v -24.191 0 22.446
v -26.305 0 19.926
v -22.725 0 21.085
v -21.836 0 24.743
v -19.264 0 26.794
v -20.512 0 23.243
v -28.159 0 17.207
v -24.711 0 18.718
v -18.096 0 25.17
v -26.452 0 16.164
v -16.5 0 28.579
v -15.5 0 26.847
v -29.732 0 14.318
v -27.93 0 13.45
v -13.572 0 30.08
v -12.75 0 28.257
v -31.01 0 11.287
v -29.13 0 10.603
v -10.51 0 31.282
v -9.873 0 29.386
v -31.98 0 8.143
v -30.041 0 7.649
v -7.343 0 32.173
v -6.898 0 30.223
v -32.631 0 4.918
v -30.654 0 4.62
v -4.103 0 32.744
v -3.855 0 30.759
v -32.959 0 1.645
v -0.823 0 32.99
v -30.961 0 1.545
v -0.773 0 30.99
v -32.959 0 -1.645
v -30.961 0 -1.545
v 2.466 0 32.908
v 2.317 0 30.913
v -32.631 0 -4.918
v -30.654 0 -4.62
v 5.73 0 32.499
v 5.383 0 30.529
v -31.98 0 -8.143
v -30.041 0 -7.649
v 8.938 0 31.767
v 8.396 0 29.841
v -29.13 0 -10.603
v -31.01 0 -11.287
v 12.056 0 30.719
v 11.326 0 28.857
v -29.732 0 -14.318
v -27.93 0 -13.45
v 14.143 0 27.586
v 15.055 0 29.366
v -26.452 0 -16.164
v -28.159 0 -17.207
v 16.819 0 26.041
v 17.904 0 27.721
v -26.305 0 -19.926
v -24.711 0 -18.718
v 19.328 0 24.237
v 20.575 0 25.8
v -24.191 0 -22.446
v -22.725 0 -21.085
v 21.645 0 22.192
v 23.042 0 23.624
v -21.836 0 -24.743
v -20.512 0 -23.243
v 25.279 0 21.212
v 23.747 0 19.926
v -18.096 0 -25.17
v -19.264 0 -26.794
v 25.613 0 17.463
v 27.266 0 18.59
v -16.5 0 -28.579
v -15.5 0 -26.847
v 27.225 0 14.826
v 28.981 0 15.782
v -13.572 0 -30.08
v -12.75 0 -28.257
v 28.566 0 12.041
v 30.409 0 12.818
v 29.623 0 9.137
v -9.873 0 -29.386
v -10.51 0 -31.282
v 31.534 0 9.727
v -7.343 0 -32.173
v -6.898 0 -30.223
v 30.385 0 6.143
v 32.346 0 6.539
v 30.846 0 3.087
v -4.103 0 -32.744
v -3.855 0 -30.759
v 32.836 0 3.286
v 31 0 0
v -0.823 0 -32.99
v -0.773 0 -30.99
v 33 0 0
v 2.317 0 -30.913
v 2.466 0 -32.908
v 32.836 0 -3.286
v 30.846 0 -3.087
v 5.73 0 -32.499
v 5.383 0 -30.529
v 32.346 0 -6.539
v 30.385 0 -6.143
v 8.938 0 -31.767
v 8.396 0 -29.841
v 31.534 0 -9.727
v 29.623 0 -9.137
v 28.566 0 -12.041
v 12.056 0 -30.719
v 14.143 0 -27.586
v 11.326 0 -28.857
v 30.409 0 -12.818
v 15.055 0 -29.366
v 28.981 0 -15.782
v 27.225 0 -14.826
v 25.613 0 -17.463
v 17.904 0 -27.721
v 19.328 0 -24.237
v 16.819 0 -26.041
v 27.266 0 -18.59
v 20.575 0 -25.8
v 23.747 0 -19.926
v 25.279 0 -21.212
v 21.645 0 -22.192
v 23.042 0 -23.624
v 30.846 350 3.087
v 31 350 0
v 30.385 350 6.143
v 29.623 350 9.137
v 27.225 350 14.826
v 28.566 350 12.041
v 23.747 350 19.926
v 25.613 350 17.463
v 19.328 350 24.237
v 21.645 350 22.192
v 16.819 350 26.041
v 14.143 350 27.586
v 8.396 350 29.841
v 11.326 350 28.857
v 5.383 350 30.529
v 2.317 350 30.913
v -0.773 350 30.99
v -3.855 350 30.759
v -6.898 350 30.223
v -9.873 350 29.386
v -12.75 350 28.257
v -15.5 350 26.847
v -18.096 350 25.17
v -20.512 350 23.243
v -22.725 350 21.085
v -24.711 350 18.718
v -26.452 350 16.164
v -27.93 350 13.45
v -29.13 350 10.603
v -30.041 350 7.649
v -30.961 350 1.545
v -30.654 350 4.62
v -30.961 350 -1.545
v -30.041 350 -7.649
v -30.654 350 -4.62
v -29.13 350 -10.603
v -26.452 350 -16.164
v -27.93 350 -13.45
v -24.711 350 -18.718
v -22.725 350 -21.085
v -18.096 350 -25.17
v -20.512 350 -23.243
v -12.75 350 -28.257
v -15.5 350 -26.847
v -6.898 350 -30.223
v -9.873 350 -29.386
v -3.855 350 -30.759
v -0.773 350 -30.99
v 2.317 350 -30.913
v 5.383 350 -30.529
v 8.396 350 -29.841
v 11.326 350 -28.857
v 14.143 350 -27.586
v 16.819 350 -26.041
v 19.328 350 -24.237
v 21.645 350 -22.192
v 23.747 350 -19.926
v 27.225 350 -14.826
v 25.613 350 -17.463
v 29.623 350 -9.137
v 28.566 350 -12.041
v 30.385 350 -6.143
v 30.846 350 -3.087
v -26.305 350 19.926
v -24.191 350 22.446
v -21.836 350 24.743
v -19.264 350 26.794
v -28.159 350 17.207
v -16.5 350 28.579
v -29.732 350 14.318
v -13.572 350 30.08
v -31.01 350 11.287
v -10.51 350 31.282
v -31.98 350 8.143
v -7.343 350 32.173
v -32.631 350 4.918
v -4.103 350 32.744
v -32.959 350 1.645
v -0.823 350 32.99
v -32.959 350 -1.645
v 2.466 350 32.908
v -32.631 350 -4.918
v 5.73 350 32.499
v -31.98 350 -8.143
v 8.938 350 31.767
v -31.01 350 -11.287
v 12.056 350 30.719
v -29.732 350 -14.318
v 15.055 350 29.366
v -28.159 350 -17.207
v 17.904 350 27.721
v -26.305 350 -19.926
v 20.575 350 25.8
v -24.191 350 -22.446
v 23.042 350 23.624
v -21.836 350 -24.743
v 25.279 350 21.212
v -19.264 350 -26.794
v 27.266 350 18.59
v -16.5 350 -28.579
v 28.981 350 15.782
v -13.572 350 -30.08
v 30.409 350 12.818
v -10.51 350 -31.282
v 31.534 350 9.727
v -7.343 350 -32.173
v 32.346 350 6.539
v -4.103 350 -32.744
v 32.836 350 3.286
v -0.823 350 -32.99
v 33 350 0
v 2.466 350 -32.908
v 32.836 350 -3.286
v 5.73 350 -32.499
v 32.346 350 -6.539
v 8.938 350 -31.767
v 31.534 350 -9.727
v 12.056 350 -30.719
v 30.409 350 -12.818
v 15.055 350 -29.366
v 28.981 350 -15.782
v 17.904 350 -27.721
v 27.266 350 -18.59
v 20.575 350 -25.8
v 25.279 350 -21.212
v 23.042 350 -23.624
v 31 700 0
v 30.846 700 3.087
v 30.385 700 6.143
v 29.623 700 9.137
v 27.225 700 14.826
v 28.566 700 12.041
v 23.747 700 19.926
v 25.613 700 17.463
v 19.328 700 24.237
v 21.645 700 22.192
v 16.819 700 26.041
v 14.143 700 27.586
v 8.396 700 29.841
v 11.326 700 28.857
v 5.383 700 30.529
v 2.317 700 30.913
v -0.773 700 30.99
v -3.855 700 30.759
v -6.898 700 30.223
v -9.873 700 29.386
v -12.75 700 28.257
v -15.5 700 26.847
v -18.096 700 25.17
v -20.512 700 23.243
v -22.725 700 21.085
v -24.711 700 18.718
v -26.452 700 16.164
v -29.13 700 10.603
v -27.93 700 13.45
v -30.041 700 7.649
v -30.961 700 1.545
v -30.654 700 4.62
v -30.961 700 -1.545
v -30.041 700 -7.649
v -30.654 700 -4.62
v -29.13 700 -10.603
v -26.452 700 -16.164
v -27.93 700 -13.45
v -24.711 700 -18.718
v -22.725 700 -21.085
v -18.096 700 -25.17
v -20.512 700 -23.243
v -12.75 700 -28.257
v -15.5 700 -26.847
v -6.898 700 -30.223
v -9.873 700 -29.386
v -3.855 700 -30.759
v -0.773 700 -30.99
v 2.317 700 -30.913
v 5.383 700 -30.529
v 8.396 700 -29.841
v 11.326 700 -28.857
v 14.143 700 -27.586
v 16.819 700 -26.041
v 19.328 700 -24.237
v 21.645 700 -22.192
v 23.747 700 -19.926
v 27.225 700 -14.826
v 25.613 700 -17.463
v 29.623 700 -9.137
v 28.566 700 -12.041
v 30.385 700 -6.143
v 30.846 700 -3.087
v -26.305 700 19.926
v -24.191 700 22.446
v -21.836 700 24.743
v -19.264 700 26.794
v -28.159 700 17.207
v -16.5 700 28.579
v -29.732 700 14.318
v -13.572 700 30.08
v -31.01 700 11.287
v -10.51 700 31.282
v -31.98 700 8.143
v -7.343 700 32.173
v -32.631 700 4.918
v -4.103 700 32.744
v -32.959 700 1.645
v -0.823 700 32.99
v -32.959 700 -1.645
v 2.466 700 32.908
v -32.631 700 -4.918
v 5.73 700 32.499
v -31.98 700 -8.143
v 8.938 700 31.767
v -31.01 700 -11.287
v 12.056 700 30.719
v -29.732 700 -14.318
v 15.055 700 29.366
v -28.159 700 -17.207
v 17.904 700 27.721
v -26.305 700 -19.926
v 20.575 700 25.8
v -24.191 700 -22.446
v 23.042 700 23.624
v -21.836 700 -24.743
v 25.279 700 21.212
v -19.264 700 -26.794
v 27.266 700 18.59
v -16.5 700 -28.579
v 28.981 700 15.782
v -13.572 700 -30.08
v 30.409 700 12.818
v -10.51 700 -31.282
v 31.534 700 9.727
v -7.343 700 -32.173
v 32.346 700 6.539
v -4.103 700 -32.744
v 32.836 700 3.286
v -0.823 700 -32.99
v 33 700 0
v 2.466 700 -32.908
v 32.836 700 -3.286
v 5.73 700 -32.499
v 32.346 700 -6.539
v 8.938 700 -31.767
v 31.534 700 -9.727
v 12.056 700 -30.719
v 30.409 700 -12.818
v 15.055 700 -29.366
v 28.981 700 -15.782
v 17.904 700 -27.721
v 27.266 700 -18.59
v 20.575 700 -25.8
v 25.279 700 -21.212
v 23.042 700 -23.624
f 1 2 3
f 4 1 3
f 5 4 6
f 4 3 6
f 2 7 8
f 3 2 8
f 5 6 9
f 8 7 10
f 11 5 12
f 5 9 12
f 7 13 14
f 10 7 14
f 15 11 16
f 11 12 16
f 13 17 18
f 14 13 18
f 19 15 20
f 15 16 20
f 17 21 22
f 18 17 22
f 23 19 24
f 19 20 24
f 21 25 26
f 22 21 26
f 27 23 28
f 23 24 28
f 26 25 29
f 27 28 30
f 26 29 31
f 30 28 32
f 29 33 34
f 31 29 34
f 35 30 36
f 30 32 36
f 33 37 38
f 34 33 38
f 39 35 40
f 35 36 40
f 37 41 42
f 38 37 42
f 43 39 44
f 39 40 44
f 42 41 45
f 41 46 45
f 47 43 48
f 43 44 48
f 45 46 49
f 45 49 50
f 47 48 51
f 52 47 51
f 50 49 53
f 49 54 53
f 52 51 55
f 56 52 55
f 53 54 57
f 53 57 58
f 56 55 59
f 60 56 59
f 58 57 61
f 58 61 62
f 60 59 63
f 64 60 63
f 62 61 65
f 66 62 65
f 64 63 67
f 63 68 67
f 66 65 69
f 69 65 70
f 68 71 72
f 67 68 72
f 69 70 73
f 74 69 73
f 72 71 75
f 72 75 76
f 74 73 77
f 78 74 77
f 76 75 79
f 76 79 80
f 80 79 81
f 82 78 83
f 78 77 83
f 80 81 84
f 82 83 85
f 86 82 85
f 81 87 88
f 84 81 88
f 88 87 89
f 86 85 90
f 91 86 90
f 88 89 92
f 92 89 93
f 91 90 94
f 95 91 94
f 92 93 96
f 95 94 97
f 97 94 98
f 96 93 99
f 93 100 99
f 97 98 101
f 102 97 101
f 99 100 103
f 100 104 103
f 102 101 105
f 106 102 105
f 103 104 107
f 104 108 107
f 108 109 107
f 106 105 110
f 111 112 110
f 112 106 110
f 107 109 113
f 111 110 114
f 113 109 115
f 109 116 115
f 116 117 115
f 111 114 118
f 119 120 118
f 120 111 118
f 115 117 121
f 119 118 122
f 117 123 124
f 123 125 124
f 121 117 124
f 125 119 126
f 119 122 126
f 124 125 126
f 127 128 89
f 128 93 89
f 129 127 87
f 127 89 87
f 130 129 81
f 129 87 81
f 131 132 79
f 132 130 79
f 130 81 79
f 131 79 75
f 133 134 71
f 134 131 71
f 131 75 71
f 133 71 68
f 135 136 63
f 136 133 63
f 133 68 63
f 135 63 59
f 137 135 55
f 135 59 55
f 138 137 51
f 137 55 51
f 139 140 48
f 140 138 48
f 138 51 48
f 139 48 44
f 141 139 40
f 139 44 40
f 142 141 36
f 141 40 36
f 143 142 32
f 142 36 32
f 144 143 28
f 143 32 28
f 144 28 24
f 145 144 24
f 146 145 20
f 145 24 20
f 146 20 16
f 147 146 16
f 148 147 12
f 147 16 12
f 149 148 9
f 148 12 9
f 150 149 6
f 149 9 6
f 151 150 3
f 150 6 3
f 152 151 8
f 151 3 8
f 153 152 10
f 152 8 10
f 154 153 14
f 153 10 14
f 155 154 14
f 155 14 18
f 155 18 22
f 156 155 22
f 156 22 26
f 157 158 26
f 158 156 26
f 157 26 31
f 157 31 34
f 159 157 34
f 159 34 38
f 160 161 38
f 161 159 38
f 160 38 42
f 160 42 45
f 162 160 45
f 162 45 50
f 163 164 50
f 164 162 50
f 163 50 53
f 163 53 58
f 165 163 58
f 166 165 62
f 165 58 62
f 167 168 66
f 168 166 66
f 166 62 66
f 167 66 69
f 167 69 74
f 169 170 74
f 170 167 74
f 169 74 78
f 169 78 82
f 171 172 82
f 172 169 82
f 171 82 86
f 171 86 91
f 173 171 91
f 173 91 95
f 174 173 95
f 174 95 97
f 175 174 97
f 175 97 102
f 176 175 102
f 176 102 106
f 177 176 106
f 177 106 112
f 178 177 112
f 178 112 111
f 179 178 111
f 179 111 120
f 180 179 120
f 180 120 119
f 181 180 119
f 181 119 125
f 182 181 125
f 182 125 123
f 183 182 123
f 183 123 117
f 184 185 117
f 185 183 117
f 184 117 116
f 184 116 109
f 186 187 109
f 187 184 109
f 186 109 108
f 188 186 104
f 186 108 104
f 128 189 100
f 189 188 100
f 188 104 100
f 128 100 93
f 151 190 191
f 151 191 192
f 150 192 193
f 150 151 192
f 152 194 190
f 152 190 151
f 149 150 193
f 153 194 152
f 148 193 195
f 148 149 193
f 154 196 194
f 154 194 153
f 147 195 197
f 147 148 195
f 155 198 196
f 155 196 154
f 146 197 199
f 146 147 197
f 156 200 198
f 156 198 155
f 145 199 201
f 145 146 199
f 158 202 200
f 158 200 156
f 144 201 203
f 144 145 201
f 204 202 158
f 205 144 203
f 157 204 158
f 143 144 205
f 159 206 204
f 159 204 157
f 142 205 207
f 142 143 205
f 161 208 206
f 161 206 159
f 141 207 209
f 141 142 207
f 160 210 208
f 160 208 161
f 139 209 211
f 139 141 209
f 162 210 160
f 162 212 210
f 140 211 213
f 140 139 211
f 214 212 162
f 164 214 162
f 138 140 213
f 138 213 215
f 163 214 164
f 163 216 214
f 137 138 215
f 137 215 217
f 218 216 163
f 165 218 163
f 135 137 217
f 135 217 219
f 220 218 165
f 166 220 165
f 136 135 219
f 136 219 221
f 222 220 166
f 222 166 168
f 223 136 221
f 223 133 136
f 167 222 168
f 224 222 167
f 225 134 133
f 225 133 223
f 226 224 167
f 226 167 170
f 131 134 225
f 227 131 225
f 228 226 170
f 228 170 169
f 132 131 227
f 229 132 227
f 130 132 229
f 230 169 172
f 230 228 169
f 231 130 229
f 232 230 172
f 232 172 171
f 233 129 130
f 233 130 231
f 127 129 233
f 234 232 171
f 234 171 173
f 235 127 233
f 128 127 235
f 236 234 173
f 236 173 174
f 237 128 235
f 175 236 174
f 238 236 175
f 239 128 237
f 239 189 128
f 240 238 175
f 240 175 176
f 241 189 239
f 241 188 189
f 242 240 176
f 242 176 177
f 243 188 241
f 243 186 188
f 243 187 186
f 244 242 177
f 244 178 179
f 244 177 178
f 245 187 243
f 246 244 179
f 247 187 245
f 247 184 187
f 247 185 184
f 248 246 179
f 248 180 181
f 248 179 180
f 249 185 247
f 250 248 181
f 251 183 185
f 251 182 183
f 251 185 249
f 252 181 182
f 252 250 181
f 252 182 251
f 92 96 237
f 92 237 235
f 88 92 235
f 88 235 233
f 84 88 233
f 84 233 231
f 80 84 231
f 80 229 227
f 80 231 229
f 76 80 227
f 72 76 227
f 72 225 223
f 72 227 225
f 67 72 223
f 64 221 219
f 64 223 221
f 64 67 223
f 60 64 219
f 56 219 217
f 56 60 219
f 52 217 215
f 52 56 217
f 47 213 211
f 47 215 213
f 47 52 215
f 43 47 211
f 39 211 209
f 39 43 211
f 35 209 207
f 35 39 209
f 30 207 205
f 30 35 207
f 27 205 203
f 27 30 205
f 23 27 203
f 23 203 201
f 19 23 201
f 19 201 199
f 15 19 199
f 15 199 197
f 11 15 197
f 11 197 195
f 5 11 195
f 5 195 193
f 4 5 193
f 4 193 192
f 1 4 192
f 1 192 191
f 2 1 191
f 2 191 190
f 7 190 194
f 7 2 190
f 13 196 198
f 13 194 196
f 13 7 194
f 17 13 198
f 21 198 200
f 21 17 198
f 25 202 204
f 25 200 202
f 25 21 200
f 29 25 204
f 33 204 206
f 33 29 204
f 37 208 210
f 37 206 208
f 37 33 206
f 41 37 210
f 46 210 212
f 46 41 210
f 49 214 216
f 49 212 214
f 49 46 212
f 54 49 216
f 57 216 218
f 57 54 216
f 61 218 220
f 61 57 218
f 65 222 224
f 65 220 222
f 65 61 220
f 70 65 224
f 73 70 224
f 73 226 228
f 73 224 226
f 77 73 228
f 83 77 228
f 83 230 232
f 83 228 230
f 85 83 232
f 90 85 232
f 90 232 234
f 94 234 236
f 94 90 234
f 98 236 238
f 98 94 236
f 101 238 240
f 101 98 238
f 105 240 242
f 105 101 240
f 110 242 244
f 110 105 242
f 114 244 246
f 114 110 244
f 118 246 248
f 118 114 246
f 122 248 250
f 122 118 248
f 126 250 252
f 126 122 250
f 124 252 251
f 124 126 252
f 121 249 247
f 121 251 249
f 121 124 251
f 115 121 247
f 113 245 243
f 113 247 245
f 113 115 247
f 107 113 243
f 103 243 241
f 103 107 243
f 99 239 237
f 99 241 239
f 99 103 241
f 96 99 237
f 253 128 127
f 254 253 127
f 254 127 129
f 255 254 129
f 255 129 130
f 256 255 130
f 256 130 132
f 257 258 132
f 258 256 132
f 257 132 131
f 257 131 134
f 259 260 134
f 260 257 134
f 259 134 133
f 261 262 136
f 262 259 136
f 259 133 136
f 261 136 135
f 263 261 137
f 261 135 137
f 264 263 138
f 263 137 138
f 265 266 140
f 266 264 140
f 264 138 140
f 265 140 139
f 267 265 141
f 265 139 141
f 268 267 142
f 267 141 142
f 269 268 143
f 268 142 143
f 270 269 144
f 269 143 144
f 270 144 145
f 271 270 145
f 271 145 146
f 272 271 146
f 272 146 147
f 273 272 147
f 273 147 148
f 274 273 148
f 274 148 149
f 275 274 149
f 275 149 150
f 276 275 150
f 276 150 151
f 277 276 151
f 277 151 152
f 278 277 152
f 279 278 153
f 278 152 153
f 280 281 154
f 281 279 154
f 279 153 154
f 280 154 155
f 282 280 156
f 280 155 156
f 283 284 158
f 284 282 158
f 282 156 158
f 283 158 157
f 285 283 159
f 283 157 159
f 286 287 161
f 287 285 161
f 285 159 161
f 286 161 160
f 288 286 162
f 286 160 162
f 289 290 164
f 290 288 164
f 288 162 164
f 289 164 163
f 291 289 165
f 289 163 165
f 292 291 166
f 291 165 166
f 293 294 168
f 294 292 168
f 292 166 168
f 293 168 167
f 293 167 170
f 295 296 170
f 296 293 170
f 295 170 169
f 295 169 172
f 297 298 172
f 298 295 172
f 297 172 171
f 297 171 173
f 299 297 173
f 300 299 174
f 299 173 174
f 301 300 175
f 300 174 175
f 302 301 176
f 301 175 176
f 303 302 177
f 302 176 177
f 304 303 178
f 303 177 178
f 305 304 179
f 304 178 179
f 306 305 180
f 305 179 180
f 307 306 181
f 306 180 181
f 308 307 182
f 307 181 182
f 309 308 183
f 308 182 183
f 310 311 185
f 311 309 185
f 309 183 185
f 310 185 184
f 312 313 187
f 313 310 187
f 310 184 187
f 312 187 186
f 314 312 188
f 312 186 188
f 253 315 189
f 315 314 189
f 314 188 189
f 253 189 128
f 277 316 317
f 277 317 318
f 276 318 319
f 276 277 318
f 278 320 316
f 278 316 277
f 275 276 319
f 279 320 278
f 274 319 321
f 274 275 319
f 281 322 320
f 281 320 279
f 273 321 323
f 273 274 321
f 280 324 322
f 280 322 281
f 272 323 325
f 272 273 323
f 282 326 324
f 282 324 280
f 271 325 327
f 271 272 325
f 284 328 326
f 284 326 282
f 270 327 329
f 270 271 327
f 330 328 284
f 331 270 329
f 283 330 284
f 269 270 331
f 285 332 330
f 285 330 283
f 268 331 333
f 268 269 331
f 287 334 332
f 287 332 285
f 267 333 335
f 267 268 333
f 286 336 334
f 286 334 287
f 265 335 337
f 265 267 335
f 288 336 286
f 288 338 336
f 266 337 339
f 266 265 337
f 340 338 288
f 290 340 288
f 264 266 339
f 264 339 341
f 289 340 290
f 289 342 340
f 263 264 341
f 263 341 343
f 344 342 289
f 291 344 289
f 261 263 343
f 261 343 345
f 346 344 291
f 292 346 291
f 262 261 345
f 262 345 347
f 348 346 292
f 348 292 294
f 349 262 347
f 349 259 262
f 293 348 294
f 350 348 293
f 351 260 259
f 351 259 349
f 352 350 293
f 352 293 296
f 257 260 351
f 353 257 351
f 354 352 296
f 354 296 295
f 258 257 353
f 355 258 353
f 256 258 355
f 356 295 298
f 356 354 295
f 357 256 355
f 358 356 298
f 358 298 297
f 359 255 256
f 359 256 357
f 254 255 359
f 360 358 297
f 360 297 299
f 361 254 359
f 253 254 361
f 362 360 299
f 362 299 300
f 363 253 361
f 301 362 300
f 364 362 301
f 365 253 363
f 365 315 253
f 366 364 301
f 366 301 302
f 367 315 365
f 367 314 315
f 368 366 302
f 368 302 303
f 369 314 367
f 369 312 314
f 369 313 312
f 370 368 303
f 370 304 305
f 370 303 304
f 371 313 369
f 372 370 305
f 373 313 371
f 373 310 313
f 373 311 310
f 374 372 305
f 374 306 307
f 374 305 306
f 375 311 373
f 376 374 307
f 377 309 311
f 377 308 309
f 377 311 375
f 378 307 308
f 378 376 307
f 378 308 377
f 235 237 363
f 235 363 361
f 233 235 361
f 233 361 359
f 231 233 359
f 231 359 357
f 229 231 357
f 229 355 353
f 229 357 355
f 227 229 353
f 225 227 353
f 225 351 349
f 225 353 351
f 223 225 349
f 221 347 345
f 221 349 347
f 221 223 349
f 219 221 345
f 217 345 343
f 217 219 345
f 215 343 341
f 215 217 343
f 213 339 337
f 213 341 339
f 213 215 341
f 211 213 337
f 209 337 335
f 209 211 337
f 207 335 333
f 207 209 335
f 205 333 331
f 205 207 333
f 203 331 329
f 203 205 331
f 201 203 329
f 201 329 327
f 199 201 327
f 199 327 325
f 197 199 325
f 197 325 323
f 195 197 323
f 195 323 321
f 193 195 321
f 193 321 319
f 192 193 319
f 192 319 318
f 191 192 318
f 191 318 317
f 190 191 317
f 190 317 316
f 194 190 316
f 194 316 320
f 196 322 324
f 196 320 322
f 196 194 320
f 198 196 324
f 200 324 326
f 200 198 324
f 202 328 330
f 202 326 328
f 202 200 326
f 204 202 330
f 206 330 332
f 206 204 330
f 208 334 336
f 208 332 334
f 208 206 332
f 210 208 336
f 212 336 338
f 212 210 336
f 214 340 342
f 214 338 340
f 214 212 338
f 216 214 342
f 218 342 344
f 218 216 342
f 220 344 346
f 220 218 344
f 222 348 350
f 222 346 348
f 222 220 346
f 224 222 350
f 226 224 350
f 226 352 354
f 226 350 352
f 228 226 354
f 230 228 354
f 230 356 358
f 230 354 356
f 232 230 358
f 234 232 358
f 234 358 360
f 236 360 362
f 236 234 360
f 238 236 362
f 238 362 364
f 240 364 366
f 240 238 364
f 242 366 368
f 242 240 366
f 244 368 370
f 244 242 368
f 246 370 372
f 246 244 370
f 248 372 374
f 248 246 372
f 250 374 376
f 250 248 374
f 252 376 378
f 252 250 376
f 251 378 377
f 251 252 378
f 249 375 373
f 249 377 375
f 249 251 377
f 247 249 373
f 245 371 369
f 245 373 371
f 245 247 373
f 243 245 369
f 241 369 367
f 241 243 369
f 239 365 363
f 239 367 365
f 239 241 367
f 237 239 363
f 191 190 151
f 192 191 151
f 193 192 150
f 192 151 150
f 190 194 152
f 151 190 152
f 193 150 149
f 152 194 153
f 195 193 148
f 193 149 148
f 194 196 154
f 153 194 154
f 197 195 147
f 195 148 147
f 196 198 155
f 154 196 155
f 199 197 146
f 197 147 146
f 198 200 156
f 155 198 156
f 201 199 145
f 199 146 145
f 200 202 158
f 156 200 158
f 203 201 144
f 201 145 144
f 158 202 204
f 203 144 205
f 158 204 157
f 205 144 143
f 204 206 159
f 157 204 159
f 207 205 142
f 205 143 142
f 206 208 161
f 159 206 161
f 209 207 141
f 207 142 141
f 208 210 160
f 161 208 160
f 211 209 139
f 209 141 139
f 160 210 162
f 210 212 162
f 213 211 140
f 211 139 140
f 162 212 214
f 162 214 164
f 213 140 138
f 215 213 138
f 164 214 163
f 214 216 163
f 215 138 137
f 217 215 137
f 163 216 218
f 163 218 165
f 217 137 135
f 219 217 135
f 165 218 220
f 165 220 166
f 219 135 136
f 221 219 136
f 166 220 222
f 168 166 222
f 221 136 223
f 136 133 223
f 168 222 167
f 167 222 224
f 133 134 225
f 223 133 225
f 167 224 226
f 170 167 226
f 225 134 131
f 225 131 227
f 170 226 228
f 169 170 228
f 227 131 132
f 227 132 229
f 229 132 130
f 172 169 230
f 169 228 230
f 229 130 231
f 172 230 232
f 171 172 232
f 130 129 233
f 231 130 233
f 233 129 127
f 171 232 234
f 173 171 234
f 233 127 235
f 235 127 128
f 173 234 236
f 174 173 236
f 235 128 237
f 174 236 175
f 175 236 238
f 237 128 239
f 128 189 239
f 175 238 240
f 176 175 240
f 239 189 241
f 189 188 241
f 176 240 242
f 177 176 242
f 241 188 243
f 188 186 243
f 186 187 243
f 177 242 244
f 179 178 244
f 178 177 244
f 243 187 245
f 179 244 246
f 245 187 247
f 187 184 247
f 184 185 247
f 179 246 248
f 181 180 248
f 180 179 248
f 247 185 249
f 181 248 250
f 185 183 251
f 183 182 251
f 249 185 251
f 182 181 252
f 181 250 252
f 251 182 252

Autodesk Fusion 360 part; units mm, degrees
sketch "Sketch1" plane through (0, 0, 0) normal (0, 1, 0) x (1, 0, 0)
  circle A0 centre (0, 0) radius 33
  circle A1 centre (0, 0) radius 31
  dimension "d1" = 66
  dimension "d2" = 62
extrude "Extrude1" add sketch "Sketch1" along normal blind 350 makes body 1
ref_plane "WorkPlane1" through (0, 350, 0) normal (0, 1, 0) x (1, 0, 0)
sketch "Sketch2" plane through (0, 350, 0) normal (0, 1, 0) x (1, 0, 0)
  circle A0 centre (0, 0) radius 31
  circle A1 centre (0, 0) radius 33
extrude "Extrude1'" add sketch "Sketch2" along normal blind 350 separate body makes body 2 in component "Upper Body Tube"
component "Upper Body Tube" placed x (1, 0, 0) y (0, 1, 0) z (0, 0, 1) at (0, 0, 0)
